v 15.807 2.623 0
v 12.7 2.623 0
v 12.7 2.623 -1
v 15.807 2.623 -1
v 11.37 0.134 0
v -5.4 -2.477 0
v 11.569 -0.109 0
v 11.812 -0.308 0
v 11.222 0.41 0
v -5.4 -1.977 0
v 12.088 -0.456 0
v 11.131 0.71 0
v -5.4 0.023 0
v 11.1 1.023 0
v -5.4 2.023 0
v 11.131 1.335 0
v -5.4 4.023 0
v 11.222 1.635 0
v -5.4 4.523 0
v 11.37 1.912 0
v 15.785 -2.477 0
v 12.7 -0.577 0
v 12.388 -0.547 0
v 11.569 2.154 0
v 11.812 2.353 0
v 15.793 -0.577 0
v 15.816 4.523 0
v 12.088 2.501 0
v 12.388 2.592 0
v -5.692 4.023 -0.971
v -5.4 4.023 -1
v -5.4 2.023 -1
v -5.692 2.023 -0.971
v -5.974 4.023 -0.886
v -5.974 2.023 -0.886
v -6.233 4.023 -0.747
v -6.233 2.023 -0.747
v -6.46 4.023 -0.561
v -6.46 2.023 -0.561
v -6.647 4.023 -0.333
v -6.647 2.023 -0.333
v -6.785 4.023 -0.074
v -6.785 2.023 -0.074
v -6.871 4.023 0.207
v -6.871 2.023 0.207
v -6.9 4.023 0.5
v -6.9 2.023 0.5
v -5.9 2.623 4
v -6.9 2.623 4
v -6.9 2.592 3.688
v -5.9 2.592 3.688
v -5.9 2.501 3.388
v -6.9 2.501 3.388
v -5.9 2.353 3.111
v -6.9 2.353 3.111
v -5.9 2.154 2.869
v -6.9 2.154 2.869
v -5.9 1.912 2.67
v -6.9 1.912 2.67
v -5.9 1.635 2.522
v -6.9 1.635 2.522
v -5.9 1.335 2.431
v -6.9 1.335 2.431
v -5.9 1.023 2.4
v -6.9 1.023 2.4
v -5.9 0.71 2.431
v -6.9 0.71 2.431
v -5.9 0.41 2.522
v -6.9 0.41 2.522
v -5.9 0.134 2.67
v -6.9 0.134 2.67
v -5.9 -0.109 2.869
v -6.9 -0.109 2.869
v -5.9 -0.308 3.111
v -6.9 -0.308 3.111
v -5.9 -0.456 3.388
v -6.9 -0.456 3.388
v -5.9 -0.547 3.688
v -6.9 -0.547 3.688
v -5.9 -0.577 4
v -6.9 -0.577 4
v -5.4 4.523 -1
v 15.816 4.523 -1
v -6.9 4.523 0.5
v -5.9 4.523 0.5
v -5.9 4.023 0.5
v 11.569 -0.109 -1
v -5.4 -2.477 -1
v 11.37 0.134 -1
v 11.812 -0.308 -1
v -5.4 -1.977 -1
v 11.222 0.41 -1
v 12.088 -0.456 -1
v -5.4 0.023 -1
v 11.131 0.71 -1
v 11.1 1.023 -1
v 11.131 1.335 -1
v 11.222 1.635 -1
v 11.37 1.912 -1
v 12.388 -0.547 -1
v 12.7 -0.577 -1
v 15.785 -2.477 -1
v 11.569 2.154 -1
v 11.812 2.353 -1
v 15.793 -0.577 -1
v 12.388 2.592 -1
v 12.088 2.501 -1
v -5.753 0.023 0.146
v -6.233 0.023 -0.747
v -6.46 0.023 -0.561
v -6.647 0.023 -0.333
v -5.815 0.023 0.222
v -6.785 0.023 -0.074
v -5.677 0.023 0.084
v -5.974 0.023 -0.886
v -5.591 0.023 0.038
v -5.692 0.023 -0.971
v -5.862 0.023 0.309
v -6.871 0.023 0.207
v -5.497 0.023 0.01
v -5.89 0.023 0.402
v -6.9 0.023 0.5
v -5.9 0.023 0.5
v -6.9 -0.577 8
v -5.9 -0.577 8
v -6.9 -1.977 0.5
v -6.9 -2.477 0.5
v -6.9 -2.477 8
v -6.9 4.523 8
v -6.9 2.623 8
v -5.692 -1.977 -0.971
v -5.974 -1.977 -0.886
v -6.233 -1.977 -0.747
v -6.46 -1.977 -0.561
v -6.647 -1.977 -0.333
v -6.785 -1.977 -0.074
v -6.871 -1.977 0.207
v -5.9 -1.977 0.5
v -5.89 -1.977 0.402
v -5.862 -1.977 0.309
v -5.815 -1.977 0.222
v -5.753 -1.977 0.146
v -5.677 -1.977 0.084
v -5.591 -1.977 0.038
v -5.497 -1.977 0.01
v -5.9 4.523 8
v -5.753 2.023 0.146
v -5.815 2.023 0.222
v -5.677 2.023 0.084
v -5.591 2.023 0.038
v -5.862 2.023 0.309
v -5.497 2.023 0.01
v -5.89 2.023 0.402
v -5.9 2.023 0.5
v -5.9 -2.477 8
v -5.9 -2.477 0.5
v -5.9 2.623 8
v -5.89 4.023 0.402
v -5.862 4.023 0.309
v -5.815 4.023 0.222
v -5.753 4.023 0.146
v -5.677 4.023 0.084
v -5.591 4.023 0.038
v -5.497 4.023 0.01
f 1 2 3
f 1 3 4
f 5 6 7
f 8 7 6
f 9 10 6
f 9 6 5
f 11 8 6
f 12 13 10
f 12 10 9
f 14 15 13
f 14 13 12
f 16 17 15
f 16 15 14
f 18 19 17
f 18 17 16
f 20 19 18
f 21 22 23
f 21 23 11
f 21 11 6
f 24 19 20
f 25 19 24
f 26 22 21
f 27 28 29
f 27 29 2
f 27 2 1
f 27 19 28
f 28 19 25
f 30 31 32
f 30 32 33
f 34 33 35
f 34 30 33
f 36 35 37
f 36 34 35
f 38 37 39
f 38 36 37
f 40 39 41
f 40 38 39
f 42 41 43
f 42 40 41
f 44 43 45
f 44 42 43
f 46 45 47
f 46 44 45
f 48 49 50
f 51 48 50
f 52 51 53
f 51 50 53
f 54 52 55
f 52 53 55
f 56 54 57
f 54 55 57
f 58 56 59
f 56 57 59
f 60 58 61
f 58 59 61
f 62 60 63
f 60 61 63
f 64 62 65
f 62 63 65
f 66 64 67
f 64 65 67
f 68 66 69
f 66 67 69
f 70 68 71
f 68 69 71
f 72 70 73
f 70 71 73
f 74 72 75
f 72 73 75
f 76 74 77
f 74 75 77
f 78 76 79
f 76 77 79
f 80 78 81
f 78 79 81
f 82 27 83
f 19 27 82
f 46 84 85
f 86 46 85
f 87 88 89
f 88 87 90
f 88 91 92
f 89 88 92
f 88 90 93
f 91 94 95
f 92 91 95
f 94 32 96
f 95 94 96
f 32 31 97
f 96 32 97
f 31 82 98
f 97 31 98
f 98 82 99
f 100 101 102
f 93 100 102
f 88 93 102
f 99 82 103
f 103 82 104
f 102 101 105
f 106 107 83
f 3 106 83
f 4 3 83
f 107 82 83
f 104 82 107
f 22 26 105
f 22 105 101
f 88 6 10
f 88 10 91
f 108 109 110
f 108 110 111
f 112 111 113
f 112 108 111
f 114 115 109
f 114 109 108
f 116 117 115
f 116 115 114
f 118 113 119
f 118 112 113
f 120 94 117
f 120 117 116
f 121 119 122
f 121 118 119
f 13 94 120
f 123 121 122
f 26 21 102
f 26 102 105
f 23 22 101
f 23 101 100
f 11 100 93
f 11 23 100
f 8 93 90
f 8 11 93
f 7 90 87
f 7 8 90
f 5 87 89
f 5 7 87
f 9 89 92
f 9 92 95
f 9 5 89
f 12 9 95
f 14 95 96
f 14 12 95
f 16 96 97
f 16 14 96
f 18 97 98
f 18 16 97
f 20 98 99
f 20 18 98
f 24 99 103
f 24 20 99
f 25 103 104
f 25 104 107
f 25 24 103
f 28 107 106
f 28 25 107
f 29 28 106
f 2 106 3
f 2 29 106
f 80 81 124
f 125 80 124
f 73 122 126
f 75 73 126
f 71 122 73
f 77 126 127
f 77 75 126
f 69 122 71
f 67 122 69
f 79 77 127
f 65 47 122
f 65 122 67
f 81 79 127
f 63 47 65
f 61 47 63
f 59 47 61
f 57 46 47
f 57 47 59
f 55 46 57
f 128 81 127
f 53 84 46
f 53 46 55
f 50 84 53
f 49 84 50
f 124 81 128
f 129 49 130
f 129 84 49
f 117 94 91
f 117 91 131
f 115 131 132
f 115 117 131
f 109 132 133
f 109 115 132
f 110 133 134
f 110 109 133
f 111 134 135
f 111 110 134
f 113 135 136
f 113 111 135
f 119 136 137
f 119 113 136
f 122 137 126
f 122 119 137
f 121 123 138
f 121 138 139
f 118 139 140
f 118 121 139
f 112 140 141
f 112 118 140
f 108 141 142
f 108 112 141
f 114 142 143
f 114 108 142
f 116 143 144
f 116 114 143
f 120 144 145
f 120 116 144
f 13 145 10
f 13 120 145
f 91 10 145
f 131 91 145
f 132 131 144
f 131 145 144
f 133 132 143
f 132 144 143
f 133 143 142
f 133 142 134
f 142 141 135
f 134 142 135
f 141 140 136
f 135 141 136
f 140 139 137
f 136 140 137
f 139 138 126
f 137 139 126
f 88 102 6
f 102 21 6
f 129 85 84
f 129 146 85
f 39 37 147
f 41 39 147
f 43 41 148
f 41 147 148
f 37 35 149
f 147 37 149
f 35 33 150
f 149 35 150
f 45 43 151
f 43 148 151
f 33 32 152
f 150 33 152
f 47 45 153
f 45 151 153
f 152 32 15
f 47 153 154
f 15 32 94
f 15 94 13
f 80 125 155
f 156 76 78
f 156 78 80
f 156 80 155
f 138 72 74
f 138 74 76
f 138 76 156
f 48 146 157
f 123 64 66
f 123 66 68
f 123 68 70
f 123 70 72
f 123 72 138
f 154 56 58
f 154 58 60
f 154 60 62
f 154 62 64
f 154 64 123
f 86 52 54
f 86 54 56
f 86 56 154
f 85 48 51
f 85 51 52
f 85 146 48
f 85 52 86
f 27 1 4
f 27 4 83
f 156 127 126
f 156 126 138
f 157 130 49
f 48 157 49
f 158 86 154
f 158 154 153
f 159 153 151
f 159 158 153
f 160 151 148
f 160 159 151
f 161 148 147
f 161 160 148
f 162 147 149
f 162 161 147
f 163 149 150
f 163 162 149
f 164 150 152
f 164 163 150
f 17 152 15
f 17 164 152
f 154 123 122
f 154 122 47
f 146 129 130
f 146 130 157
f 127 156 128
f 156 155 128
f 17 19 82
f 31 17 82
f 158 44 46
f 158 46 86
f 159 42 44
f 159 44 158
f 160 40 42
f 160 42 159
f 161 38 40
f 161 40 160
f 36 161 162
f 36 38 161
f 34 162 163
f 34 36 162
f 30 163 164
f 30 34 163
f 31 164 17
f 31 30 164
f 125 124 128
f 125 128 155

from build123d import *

# Parameters (mm, degrees)
ODGI_CIE_BAZOWE1_DEPTH             = 1
ODGI_CIE_KRAW_DZI1_STRIP_W         = 5
ODGI_CIE_KRAW_DZI1_STRIP_H         = 1
ODGI_CIE_KRAW_DZI1_STRIP_CUT_DEPTH = 7
ODGI_CIE_KRAW_DZI1_DEPTH           = 7
WYTNIJ_WYCI_GNI_CIE1_DEPTH         = 1
WYTNIJ_WYCI_GNI_CIE2_START         = -1.5
SZKIC8_W                           = 4.697403352
SZKIC8_H                           = 2
WYTNIJ_WYCI_GNI_CIE2_DEPTH         = 1.5
WYTNIJ_WYCI_GNI_CIE5_DEPTH         = 0.5
SZKIC7_W                           = 1.5
SZKIC7_H                           = 1.5
WYTNIJ_WYCI_GNI_CIE6_DEPTH         = 0.5


# Sheet-metal steps are written as plain solids
with BuildPart() as part:
    # Szkic1 → Odgięcie bazowe1 (new body)
    with BuildSketch(Plane.XY):
        with BuildLine():
            Line((-5.899587166, 4.522640333), (-5.899587166, -2.477359667))
            Line((-5.899587166, -2.477359667), (15.784981022, -2.477359667))
            Line((15.784981022, -2.477359667), (15.793364792, -0.577359667))
            Line((15.793364792, -0.577359667), (13.620412834, -0.577359667))
            Line((13.620412834, -0.577359667), (12.700412834, -0.577359667))
            ThreePointArc((12.700412834, -0.577359667), (11.100412834, 1.022640333), (12.700412834, 2.622640333))
            Line((12.700412834, 2.622640333), (13.620412834, 2.622640333))
            Line((13.620412834, 2.622640333), (15.807484825, 2.622640333))
            Line((15.807484825, 2.622640333), (15.815868595, 4.522640333))
            Line((15.815868595, 4.522640333), (-5.899587166, 4.522640333))
        make_face()
    extrude(amount=-ODGI_CIE_BAZOWE1_DEPTH)

    # Odgięcie krawędzi1 strip (across the edge) → Odgięcie krawędzi1 strip cut (cut)
    with BuildSketch(Plane(origin=(-5.899587166, 4.522640333, 0), x_dir=(1, 0, 0), z_dir=(0, -1, 0))):
        with Locations((-2, -0.5)):
            Rectangle(ODGI_CIE_KRAW_DZI1_STRIP_W, ODGI_CIE_KRAW_DZI1_STRIP_H)
    extrude(amount=ODGI_CIE_KRAW_DZI1_STRIP_CUT_DEPTH, mode=Mode.SUBTRACT)

    # Odgięcie krawędzi1 section (across the edge) → Odgięcie krawędzi1 (add)
    with BuildSketch(Plane(origin=(-5.899587166, 4.522640333, 0), x_dir=(1, 0, 0), z_dir=(0, -1, 0))):
        with BuildLine():
            Line((-1, 0.5), (-1, 8))
            Line((-1, 8), (0, 8))
            Line((0, 8), (0, 0.5))
            ThreePointArc((0, 0.5), (0.146446609, 0.146446609), (0.5, 0))
            Line((0.5, 0), (0.5, -1))
            ThreePointArc((0.5, -1), (-0.560660172, -0.560660172), (-1, 0.5))
        make_face()
    extrude(amount=ODGI_CIE_KRAW_DZI1_DEPTH)

    # Szkic5 → Wytnij-wyciągnięcie1 (cut)
    with BuildSketch(Plane.ZY.offset(6.899587166)):
        with BuildLine():
            Line((4, -0.577359667), (8, -0.577359667))
            Line((8, -0.577359667), (8, 2.622640333))
            Line((8, 2.622640333), (4, 2.622640333))
            ThreePointArc((4, 2.622640333), (2.4, 1.022640333), (4, -0.577359667))
        make_face()
    extrude(amount=-WYTNIJ_WYCI_GNI_CIE1_DEPTH, mode=Mode.SUBTRACT)

    # Szkic8 → Wytnij-wyciągnięcie2 (cut)
    with BuildSketch(Plane.ZY.offset(6.899587166).offset(WYTNIJ_WYCI_GNI_CIE2_START)):
        with Locations((-1.848701676, 1.022640333)):
            Rectangle(SZKIC8_W, SZKIC8_H)
    extrude(amount=WYTNIJ_WYCI_GNI_CIE2_DEPTH, mode=Mode.SUBTRACT)

    # Szkic6 → Wytnij-wyciągnięcie5 (cut)
    with BuildSketch(Plane.XZ.offset(2.477359667)):
        Polygon((-5.899587166, 0.5), (-5.399587166, 0), (-5.399587166, -1), (-6.899587166, -1), (-6.899587166, 0.5), align=None)
    extrude(amount=-WYTNIJ_WYCI_GNI_CIE5_DEPTH, mode=Mode.SUBTRACT)

    # Szkic7 → Wytnij-wyciągnięcie6 (cut)
    with BuildSketch(Plane(origin=(0, 4.522640333, 0), x_dir=(1, 0, 0), z_dir=(0, 1, 0))):
        with Locations((-6.149587166, 0.25)):
            Rectangle(SZKIC7_W, SZKIC7_H)
    extrude(amount=-WYTNIJ_WYCI_GNI_CIE6_DEPTH, mode=Mode.SUBTRACT)


solid = part.part
